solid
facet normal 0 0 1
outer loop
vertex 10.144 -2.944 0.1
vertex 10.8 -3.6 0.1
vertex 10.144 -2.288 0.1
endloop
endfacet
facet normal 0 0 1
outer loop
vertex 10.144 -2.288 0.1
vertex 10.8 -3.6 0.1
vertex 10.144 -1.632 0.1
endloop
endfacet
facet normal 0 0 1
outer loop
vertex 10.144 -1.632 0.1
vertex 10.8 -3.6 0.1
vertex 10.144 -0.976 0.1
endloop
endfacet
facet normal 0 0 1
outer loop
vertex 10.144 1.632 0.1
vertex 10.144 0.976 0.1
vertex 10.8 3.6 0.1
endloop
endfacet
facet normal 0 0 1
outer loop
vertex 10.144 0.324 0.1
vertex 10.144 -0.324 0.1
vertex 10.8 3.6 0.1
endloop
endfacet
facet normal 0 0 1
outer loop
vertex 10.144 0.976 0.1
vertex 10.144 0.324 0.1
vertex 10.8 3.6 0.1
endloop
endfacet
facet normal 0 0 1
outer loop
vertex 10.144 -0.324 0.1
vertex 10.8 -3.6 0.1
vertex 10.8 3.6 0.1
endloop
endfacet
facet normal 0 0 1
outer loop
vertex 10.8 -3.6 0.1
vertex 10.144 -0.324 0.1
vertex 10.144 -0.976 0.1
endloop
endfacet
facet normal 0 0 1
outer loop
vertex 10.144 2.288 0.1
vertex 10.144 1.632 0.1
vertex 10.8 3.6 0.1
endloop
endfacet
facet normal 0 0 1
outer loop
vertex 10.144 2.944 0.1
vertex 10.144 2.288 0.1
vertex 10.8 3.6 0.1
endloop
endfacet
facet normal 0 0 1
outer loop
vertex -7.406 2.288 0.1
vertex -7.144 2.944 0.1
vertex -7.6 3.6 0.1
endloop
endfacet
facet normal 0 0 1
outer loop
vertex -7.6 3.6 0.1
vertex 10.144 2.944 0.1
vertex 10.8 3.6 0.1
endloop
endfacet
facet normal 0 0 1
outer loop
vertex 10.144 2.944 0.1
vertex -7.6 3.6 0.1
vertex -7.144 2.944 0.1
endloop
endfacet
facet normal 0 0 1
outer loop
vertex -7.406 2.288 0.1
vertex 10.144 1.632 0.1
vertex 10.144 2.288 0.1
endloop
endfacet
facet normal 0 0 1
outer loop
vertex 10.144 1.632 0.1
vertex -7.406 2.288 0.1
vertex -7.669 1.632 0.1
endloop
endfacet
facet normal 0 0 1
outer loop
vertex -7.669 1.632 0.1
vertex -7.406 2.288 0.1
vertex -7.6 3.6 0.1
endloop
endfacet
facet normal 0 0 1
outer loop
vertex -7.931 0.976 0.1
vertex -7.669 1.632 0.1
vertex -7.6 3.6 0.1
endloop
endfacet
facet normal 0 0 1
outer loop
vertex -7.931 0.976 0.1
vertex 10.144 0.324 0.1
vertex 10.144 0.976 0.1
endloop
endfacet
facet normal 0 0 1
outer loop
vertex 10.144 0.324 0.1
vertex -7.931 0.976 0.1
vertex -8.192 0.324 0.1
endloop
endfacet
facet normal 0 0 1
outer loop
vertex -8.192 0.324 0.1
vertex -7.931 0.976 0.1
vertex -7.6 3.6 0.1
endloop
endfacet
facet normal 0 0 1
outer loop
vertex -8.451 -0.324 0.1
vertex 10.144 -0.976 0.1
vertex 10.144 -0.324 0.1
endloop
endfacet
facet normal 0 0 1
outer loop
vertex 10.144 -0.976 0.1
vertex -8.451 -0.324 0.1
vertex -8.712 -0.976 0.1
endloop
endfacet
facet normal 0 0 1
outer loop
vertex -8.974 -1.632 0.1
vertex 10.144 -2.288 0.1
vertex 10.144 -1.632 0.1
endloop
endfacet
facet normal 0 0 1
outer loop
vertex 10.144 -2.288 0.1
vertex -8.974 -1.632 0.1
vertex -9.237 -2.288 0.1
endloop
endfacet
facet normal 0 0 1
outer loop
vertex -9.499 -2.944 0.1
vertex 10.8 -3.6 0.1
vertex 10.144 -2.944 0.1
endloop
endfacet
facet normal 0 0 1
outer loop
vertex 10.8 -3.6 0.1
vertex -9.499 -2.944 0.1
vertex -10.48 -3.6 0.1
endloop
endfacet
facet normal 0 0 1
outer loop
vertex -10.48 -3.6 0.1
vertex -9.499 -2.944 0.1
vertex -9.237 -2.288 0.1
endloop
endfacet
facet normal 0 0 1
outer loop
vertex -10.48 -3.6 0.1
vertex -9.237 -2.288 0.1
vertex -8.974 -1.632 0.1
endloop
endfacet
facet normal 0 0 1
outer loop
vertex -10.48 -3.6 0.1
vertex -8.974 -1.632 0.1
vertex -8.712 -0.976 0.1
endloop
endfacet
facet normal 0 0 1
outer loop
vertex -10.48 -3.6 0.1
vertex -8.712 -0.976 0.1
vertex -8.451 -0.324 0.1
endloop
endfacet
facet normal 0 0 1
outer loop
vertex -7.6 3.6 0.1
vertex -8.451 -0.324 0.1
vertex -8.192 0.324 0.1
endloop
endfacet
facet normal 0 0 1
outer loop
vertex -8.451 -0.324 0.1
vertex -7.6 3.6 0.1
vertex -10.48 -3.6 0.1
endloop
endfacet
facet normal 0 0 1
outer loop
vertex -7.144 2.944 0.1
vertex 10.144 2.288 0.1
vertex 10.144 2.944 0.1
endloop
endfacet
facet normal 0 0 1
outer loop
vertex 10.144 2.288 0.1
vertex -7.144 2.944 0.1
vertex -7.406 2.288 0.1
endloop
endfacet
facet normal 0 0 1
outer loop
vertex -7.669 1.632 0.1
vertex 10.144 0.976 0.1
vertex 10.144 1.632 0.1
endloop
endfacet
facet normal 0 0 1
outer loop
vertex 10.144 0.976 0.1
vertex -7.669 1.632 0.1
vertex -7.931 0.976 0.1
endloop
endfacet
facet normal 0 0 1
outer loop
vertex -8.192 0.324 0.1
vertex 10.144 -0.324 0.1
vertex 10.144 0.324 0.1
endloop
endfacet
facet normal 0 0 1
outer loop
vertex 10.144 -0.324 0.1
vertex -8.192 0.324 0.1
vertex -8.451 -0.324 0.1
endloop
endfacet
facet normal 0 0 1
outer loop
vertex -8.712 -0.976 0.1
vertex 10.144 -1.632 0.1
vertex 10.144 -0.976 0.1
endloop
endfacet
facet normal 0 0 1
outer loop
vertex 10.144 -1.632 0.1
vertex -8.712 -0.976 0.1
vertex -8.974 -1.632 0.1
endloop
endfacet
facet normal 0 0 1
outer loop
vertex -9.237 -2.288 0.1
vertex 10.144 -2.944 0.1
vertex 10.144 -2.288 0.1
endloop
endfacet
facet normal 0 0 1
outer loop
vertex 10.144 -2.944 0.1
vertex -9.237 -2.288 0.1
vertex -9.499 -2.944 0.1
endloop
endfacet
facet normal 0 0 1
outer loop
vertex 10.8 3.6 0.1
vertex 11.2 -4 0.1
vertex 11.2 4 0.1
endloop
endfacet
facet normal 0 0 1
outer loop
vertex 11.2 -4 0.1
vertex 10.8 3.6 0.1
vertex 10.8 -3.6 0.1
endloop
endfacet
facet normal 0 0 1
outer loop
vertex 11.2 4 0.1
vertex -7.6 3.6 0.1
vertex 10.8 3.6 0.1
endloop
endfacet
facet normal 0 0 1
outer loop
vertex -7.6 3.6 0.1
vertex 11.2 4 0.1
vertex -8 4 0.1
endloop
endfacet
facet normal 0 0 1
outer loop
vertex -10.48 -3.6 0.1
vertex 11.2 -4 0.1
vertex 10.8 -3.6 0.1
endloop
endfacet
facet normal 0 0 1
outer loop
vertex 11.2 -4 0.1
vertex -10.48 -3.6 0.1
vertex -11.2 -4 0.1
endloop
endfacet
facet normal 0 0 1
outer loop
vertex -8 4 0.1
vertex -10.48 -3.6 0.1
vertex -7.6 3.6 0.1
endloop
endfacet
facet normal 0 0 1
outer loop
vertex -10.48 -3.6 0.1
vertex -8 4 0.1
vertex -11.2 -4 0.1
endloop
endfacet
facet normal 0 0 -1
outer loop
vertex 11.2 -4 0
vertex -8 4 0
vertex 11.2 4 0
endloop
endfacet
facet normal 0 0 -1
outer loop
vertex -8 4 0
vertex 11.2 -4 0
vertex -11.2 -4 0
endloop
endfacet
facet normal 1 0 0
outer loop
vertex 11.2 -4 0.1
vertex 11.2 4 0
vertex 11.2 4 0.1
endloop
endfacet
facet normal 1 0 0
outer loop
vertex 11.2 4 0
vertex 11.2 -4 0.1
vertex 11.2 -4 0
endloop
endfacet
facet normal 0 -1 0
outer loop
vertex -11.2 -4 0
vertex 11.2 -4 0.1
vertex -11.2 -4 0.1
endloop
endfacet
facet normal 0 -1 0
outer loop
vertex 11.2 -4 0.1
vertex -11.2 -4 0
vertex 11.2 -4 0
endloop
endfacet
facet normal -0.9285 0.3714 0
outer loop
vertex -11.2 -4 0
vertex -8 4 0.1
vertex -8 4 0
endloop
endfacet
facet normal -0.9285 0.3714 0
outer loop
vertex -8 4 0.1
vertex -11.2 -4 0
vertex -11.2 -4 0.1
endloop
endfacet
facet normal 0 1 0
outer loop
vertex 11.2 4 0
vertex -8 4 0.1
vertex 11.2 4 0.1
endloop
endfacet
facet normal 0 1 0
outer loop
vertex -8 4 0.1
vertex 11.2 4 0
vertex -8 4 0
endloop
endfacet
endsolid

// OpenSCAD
// file: 821472h.scad
use <../lib.scad>
function ldraw_lib__821472h() = [
// 0 Sticker  1.0 x  2.8 with Black and Light Grey Grid on Transparent Background (Right)
// 0 Name: 821472h.dat
// 0 Author: Damien Roux [Darats]
// 0 !LDRAW_ORG Part UPDATE 2015-02
// 0 !LICENSE Licensed under CC BY 2.0 and CC BY 4.0 : see CAreadme.txt
// 
// 0 BFC CERTIFY CCW
  [0,"BFC","CERTIFY"],
  [0,"BFC","CCW"],
// 
// 0 !KEYWORDS Set 5521
// 
// 0 !HISTORY 2015-12-30 [PTadmin] Official Update 2015-02
// 
// 
// 3 0 -25.36 -.25 -5.72 -27 -.25 -9 -25.36 -.25 -7.36
  [3,0,-25.36,-.25,-5.72,-27,-.25,-9,-25.36,-.25,-7.36],
// 3 0 -25.36 -.25 -4.08 -27 -.25 -9 -25.36 -.25 -5.72
  [3,0,-25.36,-.25,-4.08,-27,-.25,-9,-25.36,-.25,-5.72],
// 3 0 -25.36 -.25 -2.44 -27 -.25 -9 -25.36 -.25 -4.08
  [3,0,-25.36,-.25,-2.44,-27,-.25,-9,-25.36,-.25,-4.08],
// 3 0 -27 -.25 9 -25.36 -.25 2.44 -25.36 -.25 4.08
  [3,0,-27,-.25,9,-25.36,-.25,2.44,-25.36,-.25,4.08],
// 3 0 -27 -.25 9 -25.36 -.25 -.81 -25.36 -.25 .81
  [3,0,-27,-.25,9,-25.36,-.25,-.81,-25.36,-.25,.81],
// 3 0 -27 -.25 9 -25.36 -.25 .81 -25.36 -.25 2.44
  [3,0,-27,-.25,9,-25.36,-.25,.81,-25.36,-.25,2.44],
// 4 0 -27 -.25 -9 -25.36 -.25 -2.44 -25.36 -.25 -.81 -27 -.25 9
  [4,0,-27,-.25,-9,-25.36,-.25,-2.44,-25.36,-.25,-.81,-27,-.25,9],
// 3 0 -27 -.25 9 -25.36 -.25 4.08 -25.36 -.25 5.72
  [3,0,-27,-.25,9,-25.36,-.25,4.08,-25.36,-.25,5.72],
// 3 0 -27 -.25 9 -25.36 -.25 5.72 -25.36 -.25 7.36
  [3,0,-27,-.25,9,-25.36,-.25,5.72,-25.36,-.25,7.36],
// 3 0 19 -.25 9 17.86 -.25 7.36 18.516 -.25 5.72
  [3,0,19,-.25,9,17.86,-.25,7.36,18.516,-.25,5.72],
// 4 0 -25.36 -.25 7.36 17.86 -.25 7.36 19 -.25 9 -27 -.25 9
  [4,0,-25.36,-.25,7.36,17.86,-.25,7.36,19,-.25,9,-27,-.25,9],
// 4 0 18.516 -.25 5.72 -25.36 -.25 5.72 -25.36 -.25 4.08 19.172 -.25 4.08
  [4,0,18.516,-.25,5.72,-25.36,-.25,5.72,-25.36,-.25,4.08,19.172,-.25,4.08],
// 3 0 19 -.25 9 18.516 -.25 5.72 19.172 -.25 4.08
  [3,0,19,-.25,9,18.516,-.25,5.72,19.172,-.25,4.08],
// 3 0 19 -.25 9 19.172 -.25 4.08 19.828 -.25 2.44
  [3,0,19,-.25,9,19.172,-.25,4.08,19.828,-.25,2.44],
// 4 0 19.828 -.25 2.44 -25.36 -.25 2.44 -25.36 -.25 .81 20.48 -.25 .81
  [4,0,19.828,-.25,2.44,-25.36,-.25,2.44,-25.36,-.25,.81,20.48,-.25,.81],
// 3 0 19 -.25 9 19.828 -.25 2.44 20.48 -.25 .81
  [3,0,19,-.25,9,19.828,-.25,2.44,20.48,-.25,.81],
// 4 0 21.128 -.25 -.81 -25.36 -.25 -.81 -25.36 -.25 -2.44 21.78 -.25 -2.44
  [4,0,21.128,-.25,-.81,-25.36,-.25,-.81,-25.36,-.25,-2.44,21.78,-.25,-2.44],
// 4 0 22.436 -.25 -4.08 -25.36 -.25 -4.08 -25.36 -.25 -5.72 23.092 -.25 -5.72
  [4,0,22.436,-.25,-4.08,-25.36,-.25,-4.08,-25.36,-.25,-5.72,23.092,-.25,-5.72],
// 4 0 23.748 -.25 -7.36 -25.36 -.25 -7.36 -27 -.25 -9 26.2 -.25 -9
  [4,0,23.748,-.25,-7.36,-25.36,-.25,-7.36,-27,-.25,-9,26.2,-.25,-9],
// 3 0 23.092 -.25 -5.72 23.748 -.25 -7.36 26.2 -.25 -9
  [3,0,23.092,-.25,-5.72,23.748,-.25,-7.36,26.2,-.25,-9],
// 3 0 22.436 -.25 -4.08 23.092 -.25 -5.72 26.2 -.25 -9
  [3,0,22.436,-.25,-4.08,23.092,-.25,-5.72,26.2,-.25,-9],
// 3 0 21.78 -.25 -2.44 22.436 -.25 -4.08 26.2 -.25 -9
  [3,0,21.78,-.25,-2.44,22.436,-.25,-4.08,26.2,-.25,-9],
// 3 0 21.128 -.25 -.81 21.78 -.25 -2.44 26.2 -.25 -9
  [3,0,21.128,-.25,-.81,21.78,-.25,-2.44,26.2,-.25,-9],
// 4 0 19 -.25 9 20.48 -.25 .81 21.128 -.25 -.81 26.2 -.25 -9
  [4,0,19,-.25,9,20.48,-.25,.81,21.128,-.25,-.81,26.2,-.25,-9],
// 4 7 17.86 -.25 7.36 -25.36 -.25 7.36 -25.36 -.25 5.72 18.516 -.25 5.72
  [4,7,17.86,-.25,7.36,-25.36,-.25,7.36,-25.36,-.25,5.72,18.516,-.25,5.72],
// 4 7 19.172 -.25 4.08 -25.36 -.25 4.08 -25.36 -.25 2.44 19.828 -.25 2.44
  [4,7,19.172,-.25,4.08,-25.36,-.25,4.08,-25.36,-.25,2.44,19.828,-.25,2.44],
// 4 7 20.48 -.25 .81 -25.36 -.25 .81 -25.36 -.25 -.81 21.128 -.25 -.81
  [4,7,20.48,-.25,.81,-25.36,-.25,.81,-25.36,-.25,-.81,21.128,-.25,-.81],
// 4 7 21.78 -.25 -2.44 -25.36 -.25 -2.44 -25.36 -.25 -4.08 22.436 -.25 -4.08
  [4,7,21.78,-.25,-2.44,-25.36,-.25,-2.44,-25.36,-.25,-4.08,22.436,-.25,-4.08],
// 4 7 23.092 -.25 -5.72 -25.36 -.25 -5.72 -25.36 -.25 -7.36 23.748 -.25 -7.36
  [4,7,23.092,-.25,-5.72,-25.36,-.25,-5.72,-25.36,-.25,-7.36,23.748,-.25,-7.36],
// 4 16 -27 -.25 9 -28 -.25 10 -28 -.25 -10 -27 -.25 -9
  [4,16,-27,-.25,9,-28,-.25,10,-28,-.25,-10,-27,-.25,-9],
// 4 16 19 -.25 9 20 -.25 10 -28 -.25 10 -27 -.25 9
  [4,16,19,-.25,9,20,-.25,10,-28,-.25,10,-27,-.25,9],
// 4 16 26.2 -.25 -9 -27 -.25 -9 -28 -.25 -10 28 -.25 -10
  [4,16,26.2,-.25,-9,-27,-.25,-9,-28,-.25,-10,28,-.25,-10],
// 4 16 26.2 -.25 -9 28 -.25 -10 20 -.25 10 19 -.25 9
  [4,16,26.2,-.25,-9,28,-.25,-10,20,-.25,10,19,-.25,9],
// 
// 4 16 -28 0 10 20 0 10 28 0 -10 -28 0 -10
  [4,16,-28,0,10,20,0,10,28,0,-10,-28,0,-10],
// 4 16 -28 -.25 10 -28 0 10 -28 0 -10 -28 -.25 -10
  [4,16,-28,-.25,10,-28,0,10,-28,0,-10,-28,-.25,-10],
// 4 16 -28 -.25 -10 -28 0 -10 28 0 -10 28 -.25 -10
  [4,16,-28,-.25,-10,-28,0,-10,28,0,-10,28,-.25,-10],
// 4 16 28 0 -10 20 0 10 20 -.25 10 28 -.25 -10
  [4,16,28,0,-10,20,0,10,20,-.25,10,28,-.25,-10],
// 4 16 20 0 10 -28 0 10 -28 -.25 10 20 -.25 10
  [4,16,20,0,10,-28,0,10,-28,-.25,10,20,-.25,10],
];
makepoly(ldraw_lib__821472h(), line=0.2);
// main file
use <../lib.scad>
use <821472h.scad>
function ldraw_lib__821472i() = [
// 0 Sticker  1.0 x  2.8 with Black and Light Grey Grid on Transparent Background (Left)
// 0 Name: 821472i.dat
// 0 Author: Damien Roux [Darats]
// 0 !LDRAW_ORG Part UPDATE 2015-02
// 0 !LICENSE Licensed under CC BY 2.0 and CC BY 4.0 : see CAreadme.txt
// 
// 0 BFC CERTIFY CCW
  [0,"BFC","CERTIFY"],
  [0,"BFC","CCW"],
// 
// 0 !KEYWORDS Set 5521
// 
// 0 !HISTORY 2015-12-30 [PTadmin] Official Update 2015-02
// 
// 
// 1 16 0 0 0 -1 0 0 0 1 0 0 0 1 821472h.dat
  [1,16,0,0,0,-1,0,0,0,1,0,0,0,1, ldraw_lib__821472h()],
];
makepoly(ldraw_lib__821472i(), line=0.2);
